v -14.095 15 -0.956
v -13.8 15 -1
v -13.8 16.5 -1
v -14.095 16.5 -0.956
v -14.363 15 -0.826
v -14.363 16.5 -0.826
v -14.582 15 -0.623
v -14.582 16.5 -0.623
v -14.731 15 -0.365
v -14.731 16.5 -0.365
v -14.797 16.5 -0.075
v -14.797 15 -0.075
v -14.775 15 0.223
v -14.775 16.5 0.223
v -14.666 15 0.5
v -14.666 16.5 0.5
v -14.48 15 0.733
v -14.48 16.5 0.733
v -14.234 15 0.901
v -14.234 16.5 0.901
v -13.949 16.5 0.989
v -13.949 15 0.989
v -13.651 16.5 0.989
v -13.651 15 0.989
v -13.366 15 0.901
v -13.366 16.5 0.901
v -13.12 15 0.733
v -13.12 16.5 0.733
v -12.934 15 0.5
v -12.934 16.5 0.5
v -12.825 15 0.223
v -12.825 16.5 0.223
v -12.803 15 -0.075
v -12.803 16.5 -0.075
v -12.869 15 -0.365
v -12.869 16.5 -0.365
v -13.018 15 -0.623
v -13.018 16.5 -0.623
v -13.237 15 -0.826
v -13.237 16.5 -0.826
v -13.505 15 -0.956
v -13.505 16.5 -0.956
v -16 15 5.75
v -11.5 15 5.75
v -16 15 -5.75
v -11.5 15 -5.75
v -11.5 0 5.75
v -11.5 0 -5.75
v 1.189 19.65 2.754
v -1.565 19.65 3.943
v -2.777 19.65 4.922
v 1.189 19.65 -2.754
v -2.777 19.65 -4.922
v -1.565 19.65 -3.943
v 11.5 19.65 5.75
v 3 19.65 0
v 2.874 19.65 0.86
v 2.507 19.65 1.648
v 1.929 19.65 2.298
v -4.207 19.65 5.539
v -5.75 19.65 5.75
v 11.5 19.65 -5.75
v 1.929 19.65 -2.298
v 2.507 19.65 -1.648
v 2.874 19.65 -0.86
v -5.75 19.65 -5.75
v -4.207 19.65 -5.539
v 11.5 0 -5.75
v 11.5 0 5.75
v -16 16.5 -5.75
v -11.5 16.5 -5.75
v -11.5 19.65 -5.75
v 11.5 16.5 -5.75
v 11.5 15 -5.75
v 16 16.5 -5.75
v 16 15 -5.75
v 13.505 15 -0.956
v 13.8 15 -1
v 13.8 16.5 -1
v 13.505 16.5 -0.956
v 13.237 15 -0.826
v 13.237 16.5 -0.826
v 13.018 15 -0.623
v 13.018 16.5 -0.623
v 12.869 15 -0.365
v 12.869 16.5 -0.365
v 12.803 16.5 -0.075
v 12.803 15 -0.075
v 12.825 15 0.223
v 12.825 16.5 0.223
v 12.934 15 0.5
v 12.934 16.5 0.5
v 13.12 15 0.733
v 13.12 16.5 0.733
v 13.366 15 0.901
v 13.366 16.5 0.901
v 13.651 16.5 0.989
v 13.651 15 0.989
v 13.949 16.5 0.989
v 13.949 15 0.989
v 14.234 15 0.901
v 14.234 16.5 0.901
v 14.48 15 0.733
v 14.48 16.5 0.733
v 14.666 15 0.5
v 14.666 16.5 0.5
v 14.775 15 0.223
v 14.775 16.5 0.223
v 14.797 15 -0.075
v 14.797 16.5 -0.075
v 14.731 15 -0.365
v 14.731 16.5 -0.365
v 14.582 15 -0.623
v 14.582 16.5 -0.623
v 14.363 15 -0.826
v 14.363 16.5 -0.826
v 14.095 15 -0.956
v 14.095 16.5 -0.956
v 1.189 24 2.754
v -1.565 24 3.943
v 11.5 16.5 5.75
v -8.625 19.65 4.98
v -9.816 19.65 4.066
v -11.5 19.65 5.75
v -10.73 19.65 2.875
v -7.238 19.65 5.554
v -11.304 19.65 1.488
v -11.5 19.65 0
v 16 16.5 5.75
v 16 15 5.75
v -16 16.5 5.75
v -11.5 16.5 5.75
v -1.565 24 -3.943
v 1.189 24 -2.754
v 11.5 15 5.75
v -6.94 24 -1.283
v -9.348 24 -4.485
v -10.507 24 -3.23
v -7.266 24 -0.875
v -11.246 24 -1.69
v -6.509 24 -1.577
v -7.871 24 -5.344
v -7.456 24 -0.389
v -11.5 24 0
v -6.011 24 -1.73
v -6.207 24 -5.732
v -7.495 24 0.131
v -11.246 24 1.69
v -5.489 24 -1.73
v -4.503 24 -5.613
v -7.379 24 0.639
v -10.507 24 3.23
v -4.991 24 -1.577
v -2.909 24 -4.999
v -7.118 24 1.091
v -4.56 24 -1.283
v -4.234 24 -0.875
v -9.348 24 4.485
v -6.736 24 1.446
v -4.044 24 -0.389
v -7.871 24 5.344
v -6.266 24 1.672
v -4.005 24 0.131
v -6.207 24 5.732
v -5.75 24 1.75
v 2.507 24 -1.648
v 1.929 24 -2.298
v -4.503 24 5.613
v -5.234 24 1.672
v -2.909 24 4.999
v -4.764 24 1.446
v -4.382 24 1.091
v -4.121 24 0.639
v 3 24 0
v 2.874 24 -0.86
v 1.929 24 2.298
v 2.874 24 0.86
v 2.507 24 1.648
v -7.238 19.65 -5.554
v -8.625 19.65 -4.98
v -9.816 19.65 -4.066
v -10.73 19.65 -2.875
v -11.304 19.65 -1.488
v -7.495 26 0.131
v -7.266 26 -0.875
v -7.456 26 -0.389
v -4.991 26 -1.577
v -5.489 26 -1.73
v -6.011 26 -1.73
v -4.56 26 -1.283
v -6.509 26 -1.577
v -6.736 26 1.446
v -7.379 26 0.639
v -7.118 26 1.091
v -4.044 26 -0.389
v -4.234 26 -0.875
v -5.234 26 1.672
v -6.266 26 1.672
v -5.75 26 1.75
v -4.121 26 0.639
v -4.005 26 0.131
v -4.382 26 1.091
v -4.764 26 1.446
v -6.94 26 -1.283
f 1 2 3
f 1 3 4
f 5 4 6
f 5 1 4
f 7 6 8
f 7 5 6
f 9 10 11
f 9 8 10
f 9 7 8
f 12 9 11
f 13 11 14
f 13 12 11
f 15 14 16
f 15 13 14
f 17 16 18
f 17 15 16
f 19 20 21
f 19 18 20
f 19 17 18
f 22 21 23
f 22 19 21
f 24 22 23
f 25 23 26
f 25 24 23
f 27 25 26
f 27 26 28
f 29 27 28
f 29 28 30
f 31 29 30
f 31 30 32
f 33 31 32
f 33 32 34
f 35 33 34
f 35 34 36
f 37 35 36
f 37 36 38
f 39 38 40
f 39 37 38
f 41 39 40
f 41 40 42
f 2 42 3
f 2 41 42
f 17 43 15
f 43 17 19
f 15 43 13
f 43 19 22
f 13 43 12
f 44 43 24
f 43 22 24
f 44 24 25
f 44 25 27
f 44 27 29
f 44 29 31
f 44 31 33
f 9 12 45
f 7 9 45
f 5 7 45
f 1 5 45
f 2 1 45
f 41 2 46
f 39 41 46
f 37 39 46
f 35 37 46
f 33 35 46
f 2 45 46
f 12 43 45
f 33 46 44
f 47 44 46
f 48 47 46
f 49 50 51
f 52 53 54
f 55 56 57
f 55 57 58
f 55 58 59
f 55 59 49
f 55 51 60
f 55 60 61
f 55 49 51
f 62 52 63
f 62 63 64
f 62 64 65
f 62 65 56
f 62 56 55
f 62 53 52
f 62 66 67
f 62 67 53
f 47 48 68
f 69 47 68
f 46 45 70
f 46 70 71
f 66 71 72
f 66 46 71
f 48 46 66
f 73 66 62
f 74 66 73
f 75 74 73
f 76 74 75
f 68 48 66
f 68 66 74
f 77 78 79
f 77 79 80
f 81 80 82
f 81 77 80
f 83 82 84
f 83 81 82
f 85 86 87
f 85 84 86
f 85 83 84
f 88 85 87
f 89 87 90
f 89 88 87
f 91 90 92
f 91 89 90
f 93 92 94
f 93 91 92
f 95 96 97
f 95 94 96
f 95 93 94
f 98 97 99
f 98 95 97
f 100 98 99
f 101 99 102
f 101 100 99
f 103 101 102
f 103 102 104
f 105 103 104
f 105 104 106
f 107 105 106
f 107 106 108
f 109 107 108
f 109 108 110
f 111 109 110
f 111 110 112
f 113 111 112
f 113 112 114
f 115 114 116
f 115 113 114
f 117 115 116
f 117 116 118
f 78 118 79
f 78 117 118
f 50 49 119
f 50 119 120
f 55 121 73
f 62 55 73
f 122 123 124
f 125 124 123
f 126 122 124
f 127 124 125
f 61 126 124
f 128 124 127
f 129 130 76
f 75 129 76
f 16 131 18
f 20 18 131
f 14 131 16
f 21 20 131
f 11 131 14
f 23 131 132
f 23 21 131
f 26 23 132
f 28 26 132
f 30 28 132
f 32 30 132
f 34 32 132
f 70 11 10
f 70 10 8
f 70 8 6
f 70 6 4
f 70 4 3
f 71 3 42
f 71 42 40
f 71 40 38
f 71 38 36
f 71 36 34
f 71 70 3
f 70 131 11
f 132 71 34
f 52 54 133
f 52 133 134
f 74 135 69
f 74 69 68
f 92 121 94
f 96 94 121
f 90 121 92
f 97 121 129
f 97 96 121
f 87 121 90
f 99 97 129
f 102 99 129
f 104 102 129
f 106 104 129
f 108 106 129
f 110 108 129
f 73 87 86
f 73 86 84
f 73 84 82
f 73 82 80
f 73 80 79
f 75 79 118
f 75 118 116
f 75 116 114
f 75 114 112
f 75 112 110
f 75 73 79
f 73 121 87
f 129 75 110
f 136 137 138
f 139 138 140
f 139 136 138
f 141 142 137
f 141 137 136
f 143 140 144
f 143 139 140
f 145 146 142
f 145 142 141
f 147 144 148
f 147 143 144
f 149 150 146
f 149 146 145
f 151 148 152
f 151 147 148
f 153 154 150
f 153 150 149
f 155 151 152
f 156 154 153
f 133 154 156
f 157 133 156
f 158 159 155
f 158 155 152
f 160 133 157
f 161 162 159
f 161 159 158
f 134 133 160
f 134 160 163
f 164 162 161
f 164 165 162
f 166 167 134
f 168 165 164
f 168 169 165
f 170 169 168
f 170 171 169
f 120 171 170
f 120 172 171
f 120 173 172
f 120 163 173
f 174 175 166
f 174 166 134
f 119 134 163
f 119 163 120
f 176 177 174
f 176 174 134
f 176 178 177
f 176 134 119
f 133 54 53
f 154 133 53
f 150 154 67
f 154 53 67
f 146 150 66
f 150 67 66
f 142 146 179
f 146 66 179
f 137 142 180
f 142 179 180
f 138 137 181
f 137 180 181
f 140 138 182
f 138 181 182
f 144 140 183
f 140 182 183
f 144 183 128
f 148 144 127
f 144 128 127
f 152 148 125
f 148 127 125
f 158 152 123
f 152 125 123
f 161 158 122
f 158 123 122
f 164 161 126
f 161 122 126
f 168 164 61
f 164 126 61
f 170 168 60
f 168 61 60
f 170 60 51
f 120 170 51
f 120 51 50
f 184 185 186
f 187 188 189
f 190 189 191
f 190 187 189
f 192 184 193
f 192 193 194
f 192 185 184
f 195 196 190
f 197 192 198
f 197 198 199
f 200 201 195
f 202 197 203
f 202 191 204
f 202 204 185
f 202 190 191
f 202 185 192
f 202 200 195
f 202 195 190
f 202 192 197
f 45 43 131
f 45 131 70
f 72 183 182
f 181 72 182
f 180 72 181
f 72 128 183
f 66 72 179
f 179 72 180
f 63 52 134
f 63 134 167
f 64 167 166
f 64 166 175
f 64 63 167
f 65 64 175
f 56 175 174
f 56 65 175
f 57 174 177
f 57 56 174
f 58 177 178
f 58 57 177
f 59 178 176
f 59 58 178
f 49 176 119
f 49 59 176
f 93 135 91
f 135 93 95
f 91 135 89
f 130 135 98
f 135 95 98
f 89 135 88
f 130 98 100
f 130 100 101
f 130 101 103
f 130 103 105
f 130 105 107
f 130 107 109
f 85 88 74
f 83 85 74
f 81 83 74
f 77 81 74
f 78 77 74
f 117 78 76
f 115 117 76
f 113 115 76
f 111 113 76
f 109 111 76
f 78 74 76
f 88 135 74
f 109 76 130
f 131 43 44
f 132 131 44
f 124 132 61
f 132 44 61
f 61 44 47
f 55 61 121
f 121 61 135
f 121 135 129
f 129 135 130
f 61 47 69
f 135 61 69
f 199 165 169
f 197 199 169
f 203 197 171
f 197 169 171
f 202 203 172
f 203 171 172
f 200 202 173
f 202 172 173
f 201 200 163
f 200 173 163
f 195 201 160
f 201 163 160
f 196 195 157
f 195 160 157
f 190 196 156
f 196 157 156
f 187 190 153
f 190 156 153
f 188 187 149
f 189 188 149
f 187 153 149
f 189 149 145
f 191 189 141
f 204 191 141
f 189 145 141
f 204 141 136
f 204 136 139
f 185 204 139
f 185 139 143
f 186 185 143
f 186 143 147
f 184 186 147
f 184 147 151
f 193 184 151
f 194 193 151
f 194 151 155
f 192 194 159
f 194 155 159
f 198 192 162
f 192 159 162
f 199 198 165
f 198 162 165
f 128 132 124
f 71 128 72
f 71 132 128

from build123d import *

# Parameters (mm, degrees)
SKETCH_1_W          = 23
SKETCH_1_H          = 11.5
EXTRUDE_1_DEPTH     = 15
EXTRUDE_START       = 15
SKETCH_2_W          = 32
SKETCH_2_H          = 11.5
EXTRUDE_2_DEPTH     = 1.5
SKETCH_3_W          = 23
SKETCH_3_H          = 11.5
EXTRUDE_3_DEPTH     = 19.65
SKETCH_4_R          = 1
CUT_EXTRUDE_1_DEPTH = 19.65
SKETCH_5_R          = 5.75
EXTRUDE_4_DEPTH     = 24
EXTRUDE_5_DEPTH     = 24
EXTRUDE_START_2     = 24
SKETCH_7_R          = 1.75
EXTRUDE_6_DEPTH     = 2


with BuildPart() as part:
    # 草图1 → 凸台-拉伸1 (new body)
    with BuildSketch(Plane(origin=(0, 0, 0), x_dir=(1, 0, 0), z_dir=(0, 1, 0))):
        Rectangle(SKETCH_1_W, SKETCH_1_H)
    extrude(amount=EXTRUDE_1_DEPTH)

    # 草图2 → 凸台-拉伸2 (add)
    with BuildSketch(Plane(origin=(0, 0, 0), x_dir=(1, 0, 0), z_dir=(0, 1, 0)).offset(EXTRUDE_START)):
        Rectangle(SKETCH_2_W, SKETCH_2_H)
    extrude(amount=EXTRUDE_2_DEPTH)

    # 草图3 → 凸台-拉伸3 (add)
    with BuildSketch(Plane(origin=(0, 0, 0), x_dir=(1, 0, 0), z_dir=(0, 1, 0))):
        Rectangle(SKETCH_3_W, SKETCH_3_H)
    extrude(amount=EXTRUDE_3_DEPTH)

    # 草图4 → 切除-拉伸1 (cut)
    with BuildSketch(Plane(origin=(0, 0, 0), x_dir=(1, 0, 0), z_dir=(0, 1, 0))):
        with Locations(Location((-13.8, 0, 0), (0, 0, 90))):
            Circle(SKETCH_4_R)
        with Locations(Location((13.8, 0, 0), (0, 0, 90))):
            Circle(SKETCH_4_R)
    extrude(amount=CUT_EXTRUDE_1_DEPTH, mode=Mode.SUBTRACT)

    # 草图5 → 凸台-拉伸4 (add)
    with BuildSketch(Plane(origin=(0, 0, 0), x_dir=(1, 0, 0), z_dir=(0, 1, 0))):
        with Locations(Location((-5.75, 0, 0), (0, 0, 270))):
            Circle(SKETCH_5_R)
    extrude(amount=EXTRUDE_4_DEPTH)

    # 草图6 → 凸台-拉伸5 (add)
    with BuildSketch(Plane(origin=(0, 0, 0), x_dir=(1, 0, 0), z_dir=(0, 1, 0))):
        with BuildLine():
            Line((-1.565217391, 3.943360815), (1.189071712, 2.754289103))
            ThreePointArc((1.189071712, 2.754289103), (3, 0), (1.189071712, -2.754289103))
            Line((1.189071712, -2.754289103), (-1.565217391, -3.943360815))
            ThreePointArc((-1.565217391, -3.943360815), (-11.5, 0), (-1.565217391, 3.943360815))
        make_face()
    extrude(amount=EXTRUDE_5_DEPTH)

    # 草图7 → 凸台-拉伸6 (add)
    with BuildSketch(Plane(origin=(0, 0, 0), x_dir=(1, 0, 0), z_dir=(0, 1, 0)).offset(EXTRUDE_START_2)):
        with Locations(Location((-5.75, 0, 0), (0, 0, 270))):
            Circle(SKETCH_7_R)
    extrude(amount=EXTRUDE_6_DEPTH)


solid = part.part
